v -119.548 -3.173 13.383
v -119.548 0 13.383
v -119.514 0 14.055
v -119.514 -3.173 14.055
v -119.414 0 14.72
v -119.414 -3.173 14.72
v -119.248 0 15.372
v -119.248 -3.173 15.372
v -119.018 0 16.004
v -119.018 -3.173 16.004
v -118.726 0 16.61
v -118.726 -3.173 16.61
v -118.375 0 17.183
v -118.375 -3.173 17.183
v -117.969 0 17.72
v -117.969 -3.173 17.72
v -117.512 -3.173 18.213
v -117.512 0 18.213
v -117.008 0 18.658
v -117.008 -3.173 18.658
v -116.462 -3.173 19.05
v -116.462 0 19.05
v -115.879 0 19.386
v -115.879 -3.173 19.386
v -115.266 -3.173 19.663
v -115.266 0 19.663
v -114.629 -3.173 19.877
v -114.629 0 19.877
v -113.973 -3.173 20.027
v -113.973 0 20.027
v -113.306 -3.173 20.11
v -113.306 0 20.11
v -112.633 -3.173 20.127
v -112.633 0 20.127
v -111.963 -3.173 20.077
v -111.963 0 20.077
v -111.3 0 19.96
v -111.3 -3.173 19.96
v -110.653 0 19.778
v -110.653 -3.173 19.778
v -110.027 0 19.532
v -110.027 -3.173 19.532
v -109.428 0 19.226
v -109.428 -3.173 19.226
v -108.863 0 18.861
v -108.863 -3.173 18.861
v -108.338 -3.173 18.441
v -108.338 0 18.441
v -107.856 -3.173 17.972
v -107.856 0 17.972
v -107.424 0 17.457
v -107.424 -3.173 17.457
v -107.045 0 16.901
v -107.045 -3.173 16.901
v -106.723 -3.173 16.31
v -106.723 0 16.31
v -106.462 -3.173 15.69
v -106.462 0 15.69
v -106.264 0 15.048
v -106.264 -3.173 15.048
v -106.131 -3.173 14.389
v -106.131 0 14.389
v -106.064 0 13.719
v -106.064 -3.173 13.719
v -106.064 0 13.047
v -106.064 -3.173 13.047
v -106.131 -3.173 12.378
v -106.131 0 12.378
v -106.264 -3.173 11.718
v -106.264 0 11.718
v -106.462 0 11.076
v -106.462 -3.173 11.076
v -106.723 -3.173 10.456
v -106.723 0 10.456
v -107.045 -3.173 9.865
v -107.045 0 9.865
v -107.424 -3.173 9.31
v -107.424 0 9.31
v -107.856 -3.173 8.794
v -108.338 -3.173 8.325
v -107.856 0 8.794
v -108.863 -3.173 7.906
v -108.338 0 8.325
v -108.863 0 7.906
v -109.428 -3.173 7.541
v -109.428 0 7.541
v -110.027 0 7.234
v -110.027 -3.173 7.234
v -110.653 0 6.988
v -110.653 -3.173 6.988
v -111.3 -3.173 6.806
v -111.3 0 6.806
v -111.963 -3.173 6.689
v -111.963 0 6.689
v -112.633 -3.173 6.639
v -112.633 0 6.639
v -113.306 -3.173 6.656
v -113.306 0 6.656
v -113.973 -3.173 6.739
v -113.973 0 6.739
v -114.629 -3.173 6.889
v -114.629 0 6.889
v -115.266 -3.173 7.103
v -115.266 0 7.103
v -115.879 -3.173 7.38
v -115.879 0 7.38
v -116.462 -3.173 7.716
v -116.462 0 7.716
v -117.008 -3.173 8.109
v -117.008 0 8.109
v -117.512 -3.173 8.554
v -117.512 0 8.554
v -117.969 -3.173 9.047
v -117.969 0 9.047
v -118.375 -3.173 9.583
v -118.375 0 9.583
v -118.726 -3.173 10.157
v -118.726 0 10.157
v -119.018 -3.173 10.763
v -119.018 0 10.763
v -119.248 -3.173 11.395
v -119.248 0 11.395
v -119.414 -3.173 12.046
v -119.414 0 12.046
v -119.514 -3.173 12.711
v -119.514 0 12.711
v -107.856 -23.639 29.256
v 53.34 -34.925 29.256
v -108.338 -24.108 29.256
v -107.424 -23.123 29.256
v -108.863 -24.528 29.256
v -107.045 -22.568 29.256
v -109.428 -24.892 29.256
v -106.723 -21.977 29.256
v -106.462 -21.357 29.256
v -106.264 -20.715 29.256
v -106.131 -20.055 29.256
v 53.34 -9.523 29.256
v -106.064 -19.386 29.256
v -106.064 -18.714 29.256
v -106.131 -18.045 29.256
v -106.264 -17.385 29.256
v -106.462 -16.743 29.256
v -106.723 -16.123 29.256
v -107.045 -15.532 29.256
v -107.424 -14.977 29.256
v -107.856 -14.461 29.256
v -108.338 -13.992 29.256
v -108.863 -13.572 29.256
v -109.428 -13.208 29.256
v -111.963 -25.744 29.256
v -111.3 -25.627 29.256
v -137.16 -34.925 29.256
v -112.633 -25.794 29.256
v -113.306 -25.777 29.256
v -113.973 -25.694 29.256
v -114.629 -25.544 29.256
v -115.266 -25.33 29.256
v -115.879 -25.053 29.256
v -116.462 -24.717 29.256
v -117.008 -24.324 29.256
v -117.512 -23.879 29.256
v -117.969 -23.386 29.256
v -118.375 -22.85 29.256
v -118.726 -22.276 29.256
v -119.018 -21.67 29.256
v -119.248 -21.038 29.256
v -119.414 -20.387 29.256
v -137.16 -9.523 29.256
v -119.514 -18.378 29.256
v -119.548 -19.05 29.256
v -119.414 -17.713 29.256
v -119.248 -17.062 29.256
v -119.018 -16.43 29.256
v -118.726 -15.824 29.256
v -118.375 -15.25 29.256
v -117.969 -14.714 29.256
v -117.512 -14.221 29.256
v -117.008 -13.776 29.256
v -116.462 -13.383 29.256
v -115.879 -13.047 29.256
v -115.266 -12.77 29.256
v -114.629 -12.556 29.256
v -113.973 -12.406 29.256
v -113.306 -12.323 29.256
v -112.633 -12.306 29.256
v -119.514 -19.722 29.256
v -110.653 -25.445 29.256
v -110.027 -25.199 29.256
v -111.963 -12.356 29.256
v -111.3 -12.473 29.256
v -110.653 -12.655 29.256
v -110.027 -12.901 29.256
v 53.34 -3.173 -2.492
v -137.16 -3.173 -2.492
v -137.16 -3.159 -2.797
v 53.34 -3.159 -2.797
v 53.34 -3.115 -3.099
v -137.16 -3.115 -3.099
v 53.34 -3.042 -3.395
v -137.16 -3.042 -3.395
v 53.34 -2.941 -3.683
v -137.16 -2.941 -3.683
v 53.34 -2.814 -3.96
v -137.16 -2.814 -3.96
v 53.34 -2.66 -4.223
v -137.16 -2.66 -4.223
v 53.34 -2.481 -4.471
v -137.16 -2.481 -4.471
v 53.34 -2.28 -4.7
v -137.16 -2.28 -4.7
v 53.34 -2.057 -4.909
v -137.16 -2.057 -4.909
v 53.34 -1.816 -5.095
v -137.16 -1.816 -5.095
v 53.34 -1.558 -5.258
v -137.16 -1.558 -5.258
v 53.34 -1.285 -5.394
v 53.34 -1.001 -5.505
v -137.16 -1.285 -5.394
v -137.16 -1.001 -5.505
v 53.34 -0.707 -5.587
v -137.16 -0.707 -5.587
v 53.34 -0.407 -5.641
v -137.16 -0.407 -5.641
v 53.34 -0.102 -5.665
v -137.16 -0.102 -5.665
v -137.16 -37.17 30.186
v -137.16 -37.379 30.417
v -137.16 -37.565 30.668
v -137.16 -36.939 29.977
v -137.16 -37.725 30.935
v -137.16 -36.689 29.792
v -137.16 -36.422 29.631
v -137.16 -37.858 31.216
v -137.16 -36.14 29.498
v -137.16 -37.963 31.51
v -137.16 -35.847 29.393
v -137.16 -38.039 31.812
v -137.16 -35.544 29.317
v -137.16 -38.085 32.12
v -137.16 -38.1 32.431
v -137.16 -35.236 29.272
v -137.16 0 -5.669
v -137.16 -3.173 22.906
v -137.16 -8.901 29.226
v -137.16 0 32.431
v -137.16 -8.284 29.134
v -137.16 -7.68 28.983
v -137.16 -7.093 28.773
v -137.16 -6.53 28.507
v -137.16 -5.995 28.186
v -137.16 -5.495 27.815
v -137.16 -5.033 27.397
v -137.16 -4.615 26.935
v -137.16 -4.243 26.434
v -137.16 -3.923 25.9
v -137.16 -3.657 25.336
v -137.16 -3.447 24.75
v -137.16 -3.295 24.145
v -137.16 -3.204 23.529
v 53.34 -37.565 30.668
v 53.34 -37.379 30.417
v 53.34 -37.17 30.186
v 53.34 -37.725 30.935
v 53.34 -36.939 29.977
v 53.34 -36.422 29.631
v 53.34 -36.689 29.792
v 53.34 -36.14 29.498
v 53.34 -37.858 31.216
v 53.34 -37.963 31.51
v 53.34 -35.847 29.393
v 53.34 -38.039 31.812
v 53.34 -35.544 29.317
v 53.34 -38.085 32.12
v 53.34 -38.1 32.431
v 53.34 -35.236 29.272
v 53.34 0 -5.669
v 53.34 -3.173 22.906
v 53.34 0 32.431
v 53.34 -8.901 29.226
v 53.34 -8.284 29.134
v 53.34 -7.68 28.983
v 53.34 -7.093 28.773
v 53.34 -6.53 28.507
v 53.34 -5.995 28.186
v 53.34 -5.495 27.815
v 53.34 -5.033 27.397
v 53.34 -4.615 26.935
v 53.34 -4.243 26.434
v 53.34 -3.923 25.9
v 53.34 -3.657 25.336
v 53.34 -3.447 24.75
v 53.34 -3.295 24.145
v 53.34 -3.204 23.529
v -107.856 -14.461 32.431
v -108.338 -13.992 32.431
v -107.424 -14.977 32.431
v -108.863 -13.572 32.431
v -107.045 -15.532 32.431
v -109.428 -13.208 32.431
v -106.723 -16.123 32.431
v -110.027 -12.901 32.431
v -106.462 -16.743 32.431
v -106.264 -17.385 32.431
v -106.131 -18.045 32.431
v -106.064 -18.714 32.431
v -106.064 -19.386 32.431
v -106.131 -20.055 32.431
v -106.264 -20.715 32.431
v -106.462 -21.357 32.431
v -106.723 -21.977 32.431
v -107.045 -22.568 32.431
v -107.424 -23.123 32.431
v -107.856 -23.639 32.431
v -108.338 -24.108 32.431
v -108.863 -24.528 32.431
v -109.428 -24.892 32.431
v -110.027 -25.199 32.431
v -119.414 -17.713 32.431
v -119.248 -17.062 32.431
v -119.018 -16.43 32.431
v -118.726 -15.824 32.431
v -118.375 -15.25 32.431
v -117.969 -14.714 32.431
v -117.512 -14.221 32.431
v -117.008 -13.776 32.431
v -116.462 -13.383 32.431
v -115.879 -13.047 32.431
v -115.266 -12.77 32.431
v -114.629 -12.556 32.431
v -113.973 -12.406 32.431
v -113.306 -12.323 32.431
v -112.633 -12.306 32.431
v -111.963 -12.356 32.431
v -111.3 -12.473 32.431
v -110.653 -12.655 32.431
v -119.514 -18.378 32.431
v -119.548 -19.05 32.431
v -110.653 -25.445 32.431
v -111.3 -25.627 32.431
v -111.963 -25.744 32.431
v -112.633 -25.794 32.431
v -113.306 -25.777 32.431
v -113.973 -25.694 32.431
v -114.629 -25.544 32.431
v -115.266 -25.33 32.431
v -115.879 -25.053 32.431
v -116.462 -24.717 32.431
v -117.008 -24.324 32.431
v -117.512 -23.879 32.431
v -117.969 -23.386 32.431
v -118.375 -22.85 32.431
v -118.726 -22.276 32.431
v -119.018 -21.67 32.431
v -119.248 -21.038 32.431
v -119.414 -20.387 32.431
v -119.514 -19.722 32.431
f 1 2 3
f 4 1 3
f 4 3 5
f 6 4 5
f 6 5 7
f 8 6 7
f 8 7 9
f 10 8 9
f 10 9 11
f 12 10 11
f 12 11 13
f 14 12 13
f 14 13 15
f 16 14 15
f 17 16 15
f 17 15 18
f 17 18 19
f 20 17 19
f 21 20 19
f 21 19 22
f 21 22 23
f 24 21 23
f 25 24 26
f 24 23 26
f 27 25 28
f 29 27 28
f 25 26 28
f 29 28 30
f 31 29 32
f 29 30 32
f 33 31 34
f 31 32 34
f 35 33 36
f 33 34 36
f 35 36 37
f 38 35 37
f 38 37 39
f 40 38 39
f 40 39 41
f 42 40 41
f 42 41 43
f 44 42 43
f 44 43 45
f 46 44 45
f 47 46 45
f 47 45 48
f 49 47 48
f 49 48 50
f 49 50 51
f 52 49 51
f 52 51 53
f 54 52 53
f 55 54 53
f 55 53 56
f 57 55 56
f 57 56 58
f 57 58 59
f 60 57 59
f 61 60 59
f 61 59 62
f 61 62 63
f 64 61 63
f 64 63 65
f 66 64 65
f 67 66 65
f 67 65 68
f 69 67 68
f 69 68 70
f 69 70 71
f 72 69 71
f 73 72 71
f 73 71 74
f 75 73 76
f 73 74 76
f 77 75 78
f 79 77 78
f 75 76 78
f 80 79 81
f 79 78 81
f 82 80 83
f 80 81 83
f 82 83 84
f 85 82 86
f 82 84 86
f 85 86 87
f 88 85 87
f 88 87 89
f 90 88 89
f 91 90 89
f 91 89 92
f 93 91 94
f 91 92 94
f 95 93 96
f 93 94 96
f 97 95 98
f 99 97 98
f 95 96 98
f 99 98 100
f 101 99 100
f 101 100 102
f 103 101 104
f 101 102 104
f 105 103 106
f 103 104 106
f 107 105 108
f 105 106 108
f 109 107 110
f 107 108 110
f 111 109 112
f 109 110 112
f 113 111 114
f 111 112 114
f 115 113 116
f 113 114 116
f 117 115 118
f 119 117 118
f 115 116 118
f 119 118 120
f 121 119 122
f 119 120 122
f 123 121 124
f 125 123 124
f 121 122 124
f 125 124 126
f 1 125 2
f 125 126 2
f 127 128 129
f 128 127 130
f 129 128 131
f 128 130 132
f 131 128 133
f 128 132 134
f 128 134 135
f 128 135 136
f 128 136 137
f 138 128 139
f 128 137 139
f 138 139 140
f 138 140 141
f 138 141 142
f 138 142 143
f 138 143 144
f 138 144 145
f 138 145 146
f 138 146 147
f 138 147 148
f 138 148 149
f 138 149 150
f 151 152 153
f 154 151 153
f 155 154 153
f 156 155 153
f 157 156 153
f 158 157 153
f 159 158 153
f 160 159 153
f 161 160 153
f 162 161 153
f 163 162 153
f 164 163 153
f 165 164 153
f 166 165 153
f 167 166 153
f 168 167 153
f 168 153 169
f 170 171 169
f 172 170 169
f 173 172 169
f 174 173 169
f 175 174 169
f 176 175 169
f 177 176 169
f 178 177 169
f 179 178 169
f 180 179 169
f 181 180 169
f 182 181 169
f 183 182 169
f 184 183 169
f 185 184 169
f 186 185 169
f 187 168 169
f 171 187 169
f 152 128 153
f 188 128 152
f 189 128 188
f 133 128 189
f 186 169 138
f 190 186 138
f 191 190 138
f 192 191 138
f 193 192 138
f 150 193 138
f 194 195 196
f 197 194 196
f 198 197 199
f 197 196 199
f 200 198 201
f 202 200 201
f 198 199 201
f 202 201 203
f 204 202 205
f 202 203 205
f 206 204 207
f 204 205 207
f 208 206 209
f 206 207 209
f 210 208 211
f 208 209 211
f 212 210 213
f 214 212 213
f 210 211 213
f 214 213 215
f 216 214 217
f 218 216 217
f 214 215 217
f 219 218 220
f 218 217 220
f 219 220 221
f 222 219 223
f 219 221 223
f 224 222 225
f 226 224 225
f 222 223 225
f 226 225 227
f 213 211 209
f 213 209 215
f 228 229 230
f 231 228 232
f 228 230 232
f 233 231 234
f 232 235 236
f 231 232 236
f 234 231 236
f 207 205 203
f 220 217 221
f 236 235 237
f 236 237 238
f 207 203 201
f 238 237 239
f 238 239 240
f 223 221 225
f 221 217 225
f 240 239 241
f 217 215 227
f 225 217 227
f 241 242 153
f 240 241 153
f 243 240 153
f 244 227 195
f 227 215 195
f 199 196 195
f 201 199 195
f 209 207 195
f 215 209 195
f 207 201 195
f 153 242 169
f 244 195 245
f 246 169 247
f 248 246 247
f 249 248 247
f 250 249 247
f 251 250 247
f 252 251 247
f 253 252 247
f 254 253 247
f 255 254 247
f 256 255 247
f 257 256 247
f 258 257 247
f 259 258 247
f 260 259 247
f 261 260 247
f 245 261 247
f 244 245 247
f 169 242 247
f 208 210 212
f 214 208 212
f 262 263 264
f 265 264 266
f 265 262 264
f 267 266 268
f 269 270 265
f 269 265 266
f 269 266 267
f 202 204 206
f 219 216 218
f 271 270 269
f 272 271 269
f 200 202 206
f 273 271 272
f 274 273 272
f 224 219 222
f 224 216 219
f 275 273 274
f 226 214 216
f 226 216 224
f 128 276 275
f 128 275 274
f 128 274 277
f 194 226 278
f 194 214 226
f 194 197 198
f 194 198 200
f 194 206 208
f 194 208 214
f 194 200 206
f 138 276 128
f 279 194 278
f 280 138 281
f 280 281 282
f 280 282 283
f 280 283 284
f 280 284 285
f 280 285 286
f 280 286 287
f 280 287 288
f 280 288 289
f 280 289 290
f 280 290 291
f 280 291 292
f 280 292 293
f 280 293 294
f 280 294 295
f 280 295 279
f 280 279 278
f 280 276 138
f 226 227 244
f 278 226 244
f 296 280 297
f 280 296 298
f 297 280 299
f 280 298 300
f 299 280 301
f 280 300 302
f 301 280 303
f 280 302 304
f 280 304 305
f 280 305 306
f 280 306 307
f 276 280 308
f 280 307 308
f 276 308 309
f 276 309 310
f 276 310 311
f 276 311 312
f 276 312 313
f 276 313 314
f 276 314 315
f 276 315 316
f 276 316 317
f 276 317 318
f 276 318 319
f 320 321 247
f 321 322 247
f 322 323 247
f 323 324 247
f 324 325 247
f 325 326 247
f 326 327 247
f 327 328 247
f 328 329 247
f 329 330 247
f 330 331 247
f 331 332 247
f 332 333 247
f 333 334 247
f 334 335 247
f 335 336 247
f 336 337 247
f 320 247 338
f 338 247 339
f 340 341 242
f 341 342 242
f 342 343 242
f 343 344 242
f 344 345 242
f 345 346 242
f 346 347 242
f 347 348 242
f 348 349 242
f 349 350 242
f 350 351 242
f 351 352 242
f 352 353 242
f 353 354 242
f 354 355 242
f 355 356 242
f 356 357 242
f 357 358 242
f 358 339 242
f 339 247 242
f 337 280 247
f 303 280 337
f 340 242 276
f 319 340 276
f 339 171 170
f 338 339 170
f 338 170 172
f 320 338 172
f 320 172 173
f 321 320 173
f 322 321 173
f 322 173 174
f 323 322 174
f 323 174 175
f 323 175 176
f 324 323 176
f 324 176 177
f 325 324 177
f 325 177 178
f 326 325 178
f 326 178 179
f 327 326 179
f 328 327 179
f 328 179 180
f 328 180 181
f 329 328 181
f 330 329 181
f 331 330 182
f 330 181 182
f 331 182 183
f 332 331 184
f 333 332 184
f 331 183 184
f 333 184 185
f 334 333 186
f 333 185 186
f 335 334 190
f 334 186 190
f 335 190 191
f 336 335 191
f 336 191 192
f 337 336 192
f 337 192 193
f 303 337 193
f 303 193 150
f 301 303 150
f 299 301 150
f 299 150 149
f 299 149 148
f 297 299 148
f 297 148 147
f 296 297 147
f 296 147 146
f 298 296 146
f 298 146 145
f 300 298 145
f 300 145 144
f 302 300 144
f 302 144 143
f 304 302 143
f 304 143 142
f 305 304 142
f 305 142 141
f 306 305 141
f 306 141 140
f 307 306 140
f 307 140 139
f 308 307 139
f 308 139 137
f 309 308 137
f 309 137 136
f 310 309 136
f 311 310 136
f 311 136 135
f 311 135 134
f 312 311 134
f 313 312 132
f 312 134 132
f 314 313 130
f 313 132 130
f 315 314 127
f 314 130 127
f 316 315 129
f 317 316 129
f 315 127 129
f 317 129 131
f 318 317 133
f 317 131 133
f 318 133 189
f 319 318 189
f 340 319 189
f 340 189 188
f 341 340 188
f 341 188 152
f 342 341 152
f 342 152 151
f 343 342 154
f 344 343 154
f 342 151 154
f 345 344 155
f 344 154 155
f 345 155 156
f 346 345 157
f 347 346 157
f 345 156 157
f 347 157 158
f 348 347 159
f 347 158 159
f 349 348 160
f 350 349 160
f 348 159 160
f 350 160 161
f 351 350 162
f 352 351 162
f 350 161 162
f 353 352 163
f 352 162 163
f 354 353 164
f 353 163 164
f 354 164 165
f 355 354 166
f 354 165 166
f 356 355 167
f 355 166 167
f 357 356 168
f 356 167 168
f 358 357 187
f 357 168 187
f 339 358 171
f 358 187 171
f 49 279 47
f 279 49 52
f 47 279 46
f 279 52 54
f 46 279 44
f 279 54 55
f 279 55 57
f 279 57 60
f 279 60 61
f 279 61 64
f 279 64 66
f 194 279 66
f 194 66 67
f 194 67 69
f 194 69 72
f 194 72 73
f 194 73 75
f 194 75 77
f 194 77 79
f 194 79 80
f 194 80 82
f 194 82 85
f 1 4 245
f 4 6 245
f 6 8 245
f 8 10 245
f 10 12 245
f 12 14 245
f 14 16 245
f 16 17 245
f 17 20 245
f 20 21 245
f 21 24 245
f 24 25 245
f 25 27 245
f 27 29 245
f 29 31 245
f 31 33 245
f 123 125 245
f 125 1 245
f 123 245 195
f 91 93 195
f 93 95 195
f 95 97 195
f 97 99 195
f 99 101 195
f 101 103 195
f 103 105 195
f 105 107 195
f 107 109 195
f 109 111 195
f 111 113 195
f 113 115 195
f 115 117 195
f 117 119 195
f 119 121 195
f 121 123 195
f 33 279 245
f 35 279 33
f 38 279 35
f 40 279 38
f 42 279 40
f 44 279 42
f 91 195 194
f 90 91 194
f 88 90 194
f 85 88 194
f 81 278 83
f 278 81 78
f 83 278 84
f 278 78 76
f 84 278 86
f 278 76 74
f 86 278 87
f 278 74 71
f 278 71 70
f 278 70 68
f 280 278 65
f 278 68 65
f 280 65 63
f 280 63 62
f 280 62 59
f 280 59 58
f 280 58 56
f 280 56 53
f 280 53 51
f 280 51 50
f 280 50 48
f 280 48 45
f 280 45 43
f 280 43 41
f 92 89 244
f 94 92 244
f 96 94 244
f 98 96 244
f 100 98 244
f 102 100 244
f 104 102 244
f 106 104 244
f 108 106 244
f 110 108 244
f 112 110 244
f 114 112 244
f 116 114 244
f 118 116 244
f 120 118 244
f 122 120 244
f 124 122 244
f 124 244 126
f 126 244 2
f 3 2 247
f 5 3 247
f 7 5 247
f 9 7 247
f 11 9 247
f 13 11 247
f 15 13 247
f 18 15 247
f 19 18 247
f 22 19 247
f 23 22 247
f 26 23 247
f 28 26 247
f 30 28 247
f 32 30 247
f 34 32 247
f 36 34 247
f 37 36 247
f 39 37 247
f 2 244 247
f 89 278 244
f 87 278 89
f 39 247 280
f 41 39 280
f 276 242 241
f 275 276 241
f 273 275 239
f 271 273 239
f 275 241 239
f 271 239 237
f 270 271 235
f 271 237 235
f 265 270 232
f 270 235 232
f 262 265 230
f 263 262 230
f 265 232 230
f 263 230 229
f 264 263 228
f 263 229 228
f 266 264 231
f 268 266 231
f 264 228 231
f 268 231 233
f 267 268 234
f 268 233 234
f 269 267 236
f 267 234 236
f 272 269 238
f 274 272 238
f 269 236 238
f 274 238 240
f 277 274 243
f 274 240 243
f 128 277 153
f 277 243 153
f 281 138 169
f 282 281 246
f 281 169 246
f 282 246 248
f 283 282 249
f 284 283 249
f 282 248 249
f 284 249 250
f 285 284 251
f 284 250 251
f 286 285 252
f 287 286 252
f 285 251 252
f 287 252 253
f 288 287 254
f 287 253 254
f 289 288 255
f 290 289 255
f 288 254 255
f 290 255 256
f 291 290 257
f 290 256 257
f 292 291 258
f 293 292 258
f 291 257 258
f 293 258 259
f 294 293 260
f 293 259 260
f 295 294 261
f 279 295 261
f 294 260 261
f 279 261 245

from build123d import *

# Parameters (mm, degrees)
F1_DEPTH = 190.5
F5_D     = 13.49248
F6_D     = 13.49248


with BuildPart() as f1:
    # F0 (on Right) → F1 (new body)
    with BuildSketch(Plane.YZ):
        with BuildLine():
            Line((-0.1024892145, -7.1891873267), (0, -7.1925527072))
            Line((0, -7.1925527072), (0, 30.9074472928))
            Line((0, 30.9074472928), (-38.1, 30.9074472928))
            ThreePointArc((-38.1, 30.9074472928), (-37.1700640303, 28.6623832625), (-34.925, 27.7324472928))
            Line((-34.925, 27.7324472928), (-9.5232896904, 27.7324472928))
            ThreePointArc((-9.5232896904, 27.7324472928), (-5.0331616299, 25.8725753533), (-3.1732896904, 21.3824472928))
            Line((-3.1732896904, 21.3824472928), (-3.1732896904, -4.0158976363))
            ThreePointArc((-3.1732896904, -4.0158976363), (-2.2798964147, -6.223814246), (-0.1024892145, -7.1891873267))
        make_face()
    extrude(amount=F1_DEPTH)


with BuildPart() as f1_1:
    # F2: moved
    add(f1.part.moved(Location((-137.16, 0, 1.524))))

    # F5 (through all)
    with Locations(Plane.XY.offset(32.4314472928)):
        with Locations((-112.8014, -19.05)):
            Hole(F5_D / 2)

    # F6 (through all)
    with Locations(Plane.XZ.offset(3.1732896904)):
        with Locations((-112.8014, 13.3831023637)):
            Hole(F6_D / 2)


solid = f1_1.part
